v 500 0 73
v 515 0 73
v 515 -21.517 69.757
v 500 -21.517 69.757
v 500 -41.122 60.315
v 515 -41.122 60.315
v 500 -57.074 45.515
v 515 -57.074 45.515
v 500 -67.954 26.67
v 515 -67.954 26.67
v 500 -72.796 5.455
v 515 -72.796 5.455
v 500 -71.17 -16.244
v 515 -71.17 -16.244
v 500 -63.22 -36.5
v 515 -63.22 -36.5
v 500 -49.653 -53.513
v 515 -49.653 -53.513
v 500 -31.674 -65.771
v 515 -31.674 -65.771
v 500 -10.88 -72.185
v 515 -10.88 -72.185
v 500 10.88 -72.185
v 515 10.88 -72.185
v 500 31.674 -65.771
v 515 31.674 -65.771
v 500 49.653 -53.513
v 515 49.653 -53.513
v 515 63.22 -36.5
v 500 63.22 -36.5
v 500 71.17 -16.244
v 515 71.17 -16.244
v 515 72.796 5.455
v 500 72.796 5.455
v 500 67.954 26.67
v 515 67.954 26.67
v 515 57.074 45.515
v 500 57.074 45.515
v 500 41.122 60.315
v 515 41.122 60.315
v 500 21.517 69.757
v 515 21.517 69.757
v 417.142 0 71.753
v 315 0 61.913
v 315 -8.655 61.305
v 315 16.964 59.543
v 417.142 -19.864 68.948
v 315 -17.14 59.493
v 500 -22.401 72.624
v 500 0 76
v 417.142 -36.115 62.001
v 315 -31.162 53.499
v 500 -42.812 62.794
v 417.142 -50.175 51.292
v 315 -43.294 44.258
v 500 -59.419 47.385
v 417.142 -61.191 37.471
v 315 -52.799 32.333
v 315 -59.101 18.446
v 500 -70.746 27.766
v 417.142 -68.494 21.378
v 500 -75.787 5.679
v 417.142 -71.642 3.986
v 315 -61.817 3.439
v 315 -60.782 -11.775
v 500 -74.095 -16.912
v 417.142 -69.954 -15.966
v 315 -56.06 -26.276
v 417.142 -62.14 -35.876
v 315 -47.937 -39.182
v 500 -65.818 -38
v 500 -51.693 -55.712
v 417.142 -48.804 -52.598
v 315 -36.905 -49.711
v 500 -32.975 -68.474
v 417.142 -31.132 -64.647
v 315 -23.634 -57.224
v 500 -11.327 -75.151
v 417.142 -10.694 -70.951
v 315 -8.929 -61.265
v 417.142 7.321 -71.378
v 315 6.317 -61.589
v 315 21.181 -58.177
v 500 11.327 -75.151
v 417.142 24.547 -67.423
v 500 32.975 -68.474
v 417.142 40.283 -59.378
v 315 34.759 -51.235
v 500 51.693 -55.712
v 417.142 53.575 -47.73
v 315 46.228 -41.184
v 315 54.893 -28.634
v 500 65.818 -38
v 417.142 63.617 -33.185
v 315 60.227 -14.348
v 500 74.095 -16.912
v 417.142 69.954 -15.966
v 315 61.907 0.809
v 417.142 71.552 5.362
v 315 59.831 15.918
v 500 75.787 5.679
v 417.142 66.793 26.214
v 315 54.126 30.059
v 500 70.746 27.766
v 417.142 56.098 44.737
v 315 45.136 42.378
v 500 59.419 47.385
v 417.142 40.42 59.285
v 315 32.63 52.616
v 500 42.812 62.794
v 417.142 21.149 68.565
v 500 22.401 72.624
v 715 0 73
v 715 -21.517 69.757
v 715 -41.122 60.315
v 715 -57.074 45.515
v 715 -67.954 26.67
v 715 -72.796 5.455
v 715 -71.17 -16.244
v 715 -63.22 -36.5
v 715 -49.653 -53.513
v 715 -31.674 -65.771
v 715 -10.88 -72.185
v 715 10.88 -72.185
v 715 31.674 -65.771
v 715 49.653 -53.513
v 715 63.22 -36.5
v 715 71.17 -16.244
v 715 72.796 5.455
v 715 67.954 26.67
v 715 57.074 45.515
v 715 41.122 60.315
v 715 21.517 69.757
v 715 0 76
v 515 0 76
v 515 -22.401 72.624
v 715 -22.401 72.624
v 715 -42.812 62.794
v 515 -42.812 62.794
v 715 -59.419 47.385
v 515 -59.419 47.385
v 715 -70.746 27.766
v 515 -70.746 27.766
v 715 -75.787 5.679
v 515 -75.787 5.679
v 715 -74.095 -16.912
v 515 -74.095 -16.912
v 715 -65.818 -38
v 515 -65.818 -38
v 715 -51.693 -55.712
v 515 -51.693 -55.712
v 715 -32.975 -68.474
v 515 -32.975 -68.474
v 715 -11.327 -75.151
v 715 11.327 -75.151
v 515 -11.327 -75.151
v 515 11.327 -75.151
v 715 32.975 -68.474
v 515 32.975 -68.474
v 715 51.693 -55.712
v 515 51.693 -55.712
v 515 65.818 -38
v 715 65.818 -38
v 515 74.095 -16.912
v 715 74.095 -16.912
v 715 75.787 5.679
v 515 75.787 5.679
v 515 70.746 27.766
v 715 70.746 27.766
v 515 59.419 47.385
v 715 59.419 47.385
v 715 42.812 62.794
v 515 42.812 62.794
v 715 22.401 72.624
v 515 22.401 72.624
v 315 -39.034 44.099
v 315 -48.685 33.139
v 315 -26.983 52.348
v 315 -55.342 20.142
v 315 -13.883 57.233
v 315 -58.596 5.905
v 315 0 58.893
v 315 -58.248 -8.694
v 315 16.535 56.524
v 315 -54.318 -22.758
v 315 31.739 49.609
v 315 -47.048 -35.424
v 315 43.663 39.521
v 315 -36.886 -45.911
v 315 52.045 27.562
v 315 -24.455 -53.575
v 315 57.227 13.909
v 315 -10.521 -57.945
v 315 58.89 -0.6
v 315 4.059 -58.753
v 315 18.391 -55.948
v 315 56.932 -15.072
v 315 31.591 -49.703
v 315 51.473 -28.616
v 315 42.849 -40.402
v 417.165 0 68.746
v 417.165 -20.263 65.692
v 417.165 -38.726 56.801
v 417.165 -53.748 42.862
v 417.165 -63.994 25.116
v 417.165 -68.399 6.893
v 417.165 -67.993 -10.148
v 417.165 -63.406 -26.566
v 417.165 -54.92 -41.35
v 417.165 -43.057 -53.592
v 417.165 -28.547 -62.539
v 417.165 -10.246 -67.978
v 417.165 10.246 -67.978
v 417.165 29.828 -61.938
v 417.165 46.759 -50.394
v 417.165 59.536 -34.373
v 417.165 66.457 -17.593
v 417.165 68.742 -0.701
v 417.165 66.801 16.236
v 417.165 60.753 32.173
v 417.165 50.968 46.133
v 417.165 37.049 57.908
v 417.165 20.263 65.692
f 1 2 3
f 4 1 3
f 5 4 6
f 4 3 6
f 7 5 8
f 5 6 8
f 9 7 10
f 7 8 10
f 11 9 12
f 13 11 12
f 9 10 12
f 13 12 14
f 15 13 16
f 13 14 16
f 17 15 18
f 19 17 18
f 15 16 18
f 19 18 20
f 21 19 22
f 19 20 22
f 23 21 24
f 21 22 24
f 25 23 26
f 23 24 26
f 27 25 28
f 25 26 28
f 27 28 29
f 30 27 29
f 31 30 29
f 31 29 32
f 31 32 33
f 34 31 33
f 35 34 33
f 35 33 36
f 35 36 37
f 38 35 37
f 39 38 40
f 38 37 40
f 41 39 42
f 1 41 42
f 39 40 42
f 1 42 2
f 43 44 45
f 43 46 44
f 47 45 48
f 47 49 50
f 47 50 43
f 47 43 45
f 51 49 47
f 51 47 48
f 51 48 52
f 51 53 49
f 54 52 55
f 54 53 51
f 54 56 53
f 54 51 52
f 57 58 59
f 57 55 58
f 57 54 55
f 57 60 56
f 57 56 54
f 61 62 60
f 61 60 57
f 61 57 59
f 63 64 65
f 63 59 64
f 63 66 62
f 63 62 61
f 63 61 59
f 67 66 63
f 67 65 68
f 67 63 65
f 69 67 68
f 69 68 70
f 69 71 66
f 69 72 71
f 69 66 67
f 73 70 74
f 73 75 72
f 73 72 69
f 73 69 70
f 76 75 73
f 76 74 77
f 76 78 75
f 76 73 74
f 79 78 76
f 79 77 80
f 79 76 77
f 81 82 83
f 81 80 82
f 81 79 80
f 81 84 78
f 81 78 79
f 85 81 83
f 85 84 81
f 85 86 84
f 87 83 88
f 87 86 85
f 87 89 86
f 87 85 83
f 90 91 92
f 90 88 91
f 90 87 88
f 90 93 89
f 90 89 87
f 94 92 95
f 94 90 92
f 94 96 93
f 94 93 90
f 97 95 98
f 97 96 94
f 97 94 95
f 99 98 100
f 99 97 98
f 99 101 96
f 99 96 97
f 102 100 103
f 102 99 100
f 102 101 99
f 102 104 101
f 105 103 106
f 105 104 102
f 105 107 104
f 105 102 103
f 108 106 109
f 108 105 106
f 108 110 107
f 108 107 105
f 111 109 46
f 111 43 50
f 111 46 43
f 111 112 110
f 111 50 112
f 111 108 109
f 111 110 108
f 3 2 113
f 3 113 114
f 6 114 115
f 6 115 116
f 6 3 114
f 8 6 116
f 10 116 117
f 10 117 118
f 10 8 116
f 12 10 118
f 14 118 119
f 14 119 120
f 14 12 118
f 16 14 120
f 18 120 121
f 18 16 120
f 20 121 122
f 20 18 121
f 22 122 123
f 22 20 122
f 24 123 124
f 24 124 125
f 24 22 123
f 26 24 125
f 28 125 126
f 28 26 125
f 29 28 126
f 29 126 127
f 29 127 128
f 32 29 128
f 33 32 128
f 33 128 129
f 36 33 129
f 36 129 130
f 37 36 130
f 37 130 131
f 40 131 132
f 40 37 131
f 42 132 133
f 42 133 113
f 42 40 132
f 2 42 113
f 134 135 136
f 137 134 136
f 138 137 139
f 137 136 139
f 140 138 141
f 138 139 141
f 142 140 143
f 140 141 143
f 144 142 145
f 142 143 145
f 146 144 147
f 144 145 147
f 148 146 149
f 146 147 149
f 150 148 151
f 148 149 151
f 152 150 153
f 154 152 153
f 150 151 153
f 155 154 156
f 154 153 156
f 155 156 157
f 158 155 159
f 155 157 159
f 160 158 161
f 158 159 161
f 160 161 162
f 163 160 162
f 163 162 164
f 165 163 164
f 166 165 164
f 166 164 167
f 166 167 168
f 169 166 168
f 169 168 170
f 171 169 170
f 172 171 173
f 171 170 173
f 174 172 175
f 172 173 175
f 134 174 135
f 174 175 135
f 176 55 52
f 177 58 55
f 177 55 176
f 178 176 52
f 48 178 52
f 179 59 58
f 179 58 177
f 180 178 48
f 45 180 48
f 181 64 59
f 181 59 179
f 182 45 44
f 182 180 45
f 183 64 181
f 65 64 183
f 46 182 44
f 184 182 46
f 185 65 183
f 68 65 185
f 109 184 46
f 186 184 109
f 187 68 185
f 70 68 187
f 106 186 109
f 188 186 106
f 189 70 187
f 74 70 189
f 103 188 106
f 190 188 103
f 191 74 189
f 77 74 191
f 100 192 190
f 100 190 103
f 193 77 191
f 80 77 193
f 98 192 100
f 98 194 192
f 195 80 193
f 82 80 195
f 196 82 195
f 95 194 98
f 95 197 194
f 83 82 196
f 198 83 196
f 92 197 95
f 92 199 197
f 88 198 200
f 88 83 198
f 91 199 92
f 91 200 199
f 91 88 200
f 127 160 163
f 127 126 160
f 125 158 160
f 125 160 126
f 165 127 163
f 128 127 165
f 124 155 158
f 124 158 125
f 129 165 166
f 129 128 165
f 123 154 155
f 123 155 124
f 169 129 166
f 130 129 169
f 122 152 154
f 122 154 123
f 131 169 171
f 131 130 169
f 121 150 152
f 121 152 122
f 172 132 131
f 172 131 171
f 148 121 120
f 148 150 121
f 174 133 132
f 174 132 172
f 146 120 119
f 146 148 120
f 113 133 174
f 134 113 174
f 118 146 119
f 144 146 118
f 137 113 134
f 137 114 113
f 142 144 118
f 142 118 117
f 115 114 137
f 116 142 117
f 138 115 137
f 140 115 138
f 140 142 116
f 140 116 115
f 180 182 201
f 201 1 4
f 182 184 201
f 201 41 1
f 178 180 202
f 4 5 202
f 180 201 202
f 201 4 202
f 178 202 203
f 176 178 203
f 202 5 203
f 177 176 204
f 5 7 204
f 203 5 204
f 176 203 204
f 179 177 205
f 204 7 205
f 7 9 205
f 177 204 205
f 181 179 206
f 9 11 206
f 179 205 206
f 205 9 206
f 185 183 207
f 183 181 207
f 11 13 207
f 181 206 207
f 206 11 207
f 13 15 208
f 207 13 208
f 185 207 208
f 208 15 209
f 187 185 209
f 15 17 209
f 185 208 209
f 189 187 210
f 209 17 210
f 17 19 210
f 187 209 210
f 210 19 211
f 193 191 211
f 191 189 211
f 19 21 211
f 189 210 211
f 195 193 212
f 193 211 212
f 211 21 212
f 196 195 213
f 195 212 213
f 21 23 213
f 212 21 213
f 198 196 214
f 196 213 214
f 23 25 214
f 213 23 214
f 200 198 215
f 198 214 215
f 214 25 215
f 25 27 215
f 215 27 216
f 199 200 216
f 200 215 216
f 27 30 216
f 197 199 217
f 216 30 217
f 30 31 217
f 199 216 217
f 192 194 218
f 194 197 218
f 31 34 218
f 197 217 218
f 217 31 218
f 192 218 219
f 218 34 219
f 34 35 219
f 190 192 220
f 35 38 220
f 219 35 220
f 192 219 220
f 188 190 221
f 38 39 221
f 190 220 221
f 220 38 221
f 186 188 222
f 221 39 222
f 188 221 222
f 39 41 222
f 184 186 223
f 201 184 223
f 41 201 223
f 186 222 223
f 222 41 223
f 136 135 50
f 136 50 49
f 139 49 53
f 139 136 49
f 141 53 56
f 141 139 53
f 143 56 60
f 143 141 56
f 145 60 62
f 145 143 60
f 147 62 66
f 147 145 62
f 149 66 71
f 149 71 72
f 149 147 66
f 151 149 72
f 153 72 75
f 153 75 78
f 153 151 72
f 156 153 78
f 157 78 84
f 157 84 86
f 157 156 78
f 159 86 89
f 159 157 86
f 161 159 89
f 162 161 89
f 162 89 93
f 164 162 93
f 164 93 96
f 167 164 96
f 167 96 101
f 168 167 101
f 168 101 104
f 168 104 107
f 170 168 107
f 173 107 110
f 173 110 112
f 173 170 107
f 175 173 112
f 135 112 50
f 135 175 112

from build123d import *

# Parameters (mm, degrees)
SKETCH2_W               = 15
SKETCH2_H               = 3
CUT_EXTRUDE1_DEPTH      = 527.095998873
CUT_EXTRUDE1_DEPTH_BACK = 527.095998873
SKETCH3_W               = 60
SKETCH3_H               = 40
CUT_EXTRUDE4_DEPTH      = 200
CUT_EXTRUDE4_DEPTH_BACK = 200
SKETCH7_W               = 25.155677674
SKETCH7_H               = 116.957586973
CUT_EXTRUDE5_DEPTH      = 200
CUT_EXTRUDE5_DEPTH_BACK = 200
SKETCH10_W              = 81.753686474
SKETCH10_H              = 71.861814367
SKETCH10_H_2            = 66.111228802
SKETCH11_R              = 76
SKETCH11_R_2            = 73
BOSS_EXTRUDE1_DEPTH     = 200


with BuildPart() as part:
    # Sketch2 → Revolve1 (revolve)
    with BuildSketch(Plane.XY, mode=Mode.PRIVATE) as revolve1_sk:
        with BuildLine():
            add(Edge.make_bspline(
                [(0, 0), (0.003488157, 0.013783816), (0.01319051, 0.04033603), (0.042063455, 0.089619378), (0.103253354, 0.174781236), (0.195655925, 0.279068591), (0.312893359, 0.394476748), (0.444471001, 0.511330855), (0.626416713, 0.661995475), (0.905417524, 0.874340043), (1.39310301, 1.210288344), (2.271497179, 1.747935993), (3.81588258, 2.58108843), (6.629844229, 3.907734136), (11.732179856, 5.990626535), (20.21551767, 8.974782838), (31.724489027, 12.492116493), (45.606799288, 16.281172086), (64.651371321, 21.020860811), (87.658368898, 26.206631662), (114.722363422, 31.746320492), (145.854010301, 37.537896498), (177.066921726, 42.871807206), (208.345145014, 47.80723428), (239.678124678, 52.381191067), (271.058803785, 56.615153522), (302.482154914, 60.519680025), (330.011833268, 63.648418258), (353.631593101, 66.11894295), (373.329466343, 68.03013258), (389.09643856, 69.466784443), (404.87199461, 70.806129018), (418.683052253, 71.886996993), (430.526418849, 72.742662769), (440.399441684, 73.404435972), (448.299980017, 73.901071328), (455.214817724, 74.304775576), (461.143160456, 74.62677953), (466.084350078, 74.877801517), (470.037846817, 75.067577987), (476.005510657, 75.336303636), (481.736537174, 75.563352259), (487.230769759, 75.748085721), (492.488061525, 75.884662604), (495.116996281, 75.940348523), (497.370577281, 75.978043797), (498.87307617, 75.993594118), (499.624354134, 76), (500, 76)],
                knots=[0, 0, 0, 0, 0, 0.000111673, 0.000223346, 0.000446692, 0.000826683, 0.001206674, 0.00151955, 0.001832426, 0.00268779, 0.00396812, 0.006183448, 0.009942812, 0.016507085, 0.02846832, 0.049586633, 0.080772227, 0.111303184, 0.141834141, 0.204203935, 0.266574069, 0.32894426, 0.39131442, 0.453684463, 0.516054568, 0.578424701, 0.640794795, 0.703164955, 0.734350023, 0.765535092, 0.796720055, 0.827905019, 0.859090157, 0.874682727, 0.890275296, 0.905867787, 0.921460278, 0.929256523, 0.937052769, 0.944849014, 0.95264526, 0.97632263, 0.982241972, 0.988161315, 0.994080657, 0.997040329, 1, 1, 1, 1, 1], degree=4))
            Line((0, 0), (5.417953983, 0))
            add(Edge.make_bspline(
                [(5.417953983, 0), (5.487108618, 0.034056877), (6.008710879, 0.289194044), (7.109149759, 0.801724321), (9.332977209, 1.766377761), (12.323858805, 2.950685774), (15.979259037, 4.284137308), (19.675237412, 5.547428931), (24.644660852, 7.159251815), (30.908509069, 9.060376022), (38.481817212, 11.207101646), (48.630728592, 13.927744802), (61.390794469, 17.109248907), (76.777682749, 20.670150662), (92.21957601, 24.023267405), (107.703561132, 27.204013148), (128.394086795, 31.244920878), (154.327525342, 35.965408795), (185.530660988, 41.190734583), (216.800212994, 46.028750173), (258.5666461, 52.005891763), (310.892971562, 58.639458433), (363.34454376, 64.182605862), (405.368729998, 67.884379641), (431.657472473, 69.852194461), (452.699458369, 71.174329189), (468.485172815, 72.018357182), (481.638890805, 72.572899611), (490.843500267, 72.848246709), (495.435669889, 72.947250254), (498.061971579, 72.985030833), (499.352045651, 73), (500, 73)],
                knots=[0.009734779, 0.009734779, 0.009734779, 0.009734779, 0.01022223, 0.013399013, 0.017298621, 0.025097839, 0.032897056, 0.040696273, 0.048495491, 0.064093925, 0.07969236, 0.095290794, 0.126487664, 0.157684533, 0.188881402, 0.220078271, 0.25127514, 0.313668879, 0.376062617, 0.438456355, 0.500850093, 0.62563757, 0.750425047, 0.812818785, 0.875212523, 0.906409393, 0.937606262, 0.968803131, 0.984401565, 0.992200783, 0.996100391, 1, 1, 1, 1], degree=3))
            Line((500, 73), (500, 76))
        make_face()
        with Locations((507.5, 74.5)):
            Rectangle(SKETCH2_W, SKETCH2_H)
    revolve(revolve1_sk.sketch.rotate(Axis((0, 0, 0), (1, 0, 0)), 90), axis=Axis((0, 0, 0), (1, 0, 0)))

    # Sketch3 → Cut-Extrude1 (cut, two sides: drawn at the far end of the back side and taken through both)
    with BuildSketch(Plane.XY.offset(-CUT_EXTRUDE1_DEPTH_BACK)):
        Rectangle(SKETCH3_W, SKETCH3_H)
    extrude(amount=CUT_EXTRUDE1_DEPTH + CUT_EXTRUDE1_DEPTH_BACK, mode=Mode.SUBTRACT)

    # Sketch7 → Cut-Extrude4 (cut, two sides: drawn at the far end of the back side and taken through both)
    with BuildSketch(Plane.XY.offset(-CUT_EXTRUDE4_DEPTH_BACK)):
        with Locations((23.819627951, -5.478793487)):
            Rectangle(SKETCH7_W, SKETCH7_H)
        Polygon((36.397466788, 53), (244.628505212, 53), (244.628505212, 0), (244.628505212, -63.957586973), (36.397466788, -63.957586973), align=None)
    extrude(amount=CUT_EXTRUDE4_DEPTH + CUT_EXTRUDE4_DEPTH_BACK, mode=Mode.SUBTRACT)

    # Sketch10 → Cut-Extrude5 (cut, two sides: drawn at the far end of the back side and taken through both)
    with BuildSketch(Plane.XY.offset(-CUT_EXTRUDE5_DEPTH_BACK)):
        with Locations((274.123156763, 35.930907184)):
            Rectangle(SKETCH10_W, SKETCH10_H)
        with Locations((274.123156763, -33.055614401)):
            Rectangle(SKETCH10_W, SKETCH10_H_2)
    extrude(amount=CUT_EXTRUDE5_DEPTH + CUT_EXTRUDE5_DEPTH_BACK, mode=Mode.SUBTRACT)

    # Sketch11 → Boss-Extrude1 (add)
    with BuildSketch(Plane(origin=(515, 0, 0), x_dir=(0, 0, -1), z_dir=(1, 0, 0))):
        with Locations(Location((0, 0, 0), (0, 0, 180))):
            Circle(SKETCH11_R)
        with Locations(Location((0, 0, 0), (0, 0, 180))):
            Circle(SKETCH11_R_2, mode=Mode.SUBTRACT)
    extrude(amount=BOSS_EXTRUDE1_DEPTH)


solid = part.part
